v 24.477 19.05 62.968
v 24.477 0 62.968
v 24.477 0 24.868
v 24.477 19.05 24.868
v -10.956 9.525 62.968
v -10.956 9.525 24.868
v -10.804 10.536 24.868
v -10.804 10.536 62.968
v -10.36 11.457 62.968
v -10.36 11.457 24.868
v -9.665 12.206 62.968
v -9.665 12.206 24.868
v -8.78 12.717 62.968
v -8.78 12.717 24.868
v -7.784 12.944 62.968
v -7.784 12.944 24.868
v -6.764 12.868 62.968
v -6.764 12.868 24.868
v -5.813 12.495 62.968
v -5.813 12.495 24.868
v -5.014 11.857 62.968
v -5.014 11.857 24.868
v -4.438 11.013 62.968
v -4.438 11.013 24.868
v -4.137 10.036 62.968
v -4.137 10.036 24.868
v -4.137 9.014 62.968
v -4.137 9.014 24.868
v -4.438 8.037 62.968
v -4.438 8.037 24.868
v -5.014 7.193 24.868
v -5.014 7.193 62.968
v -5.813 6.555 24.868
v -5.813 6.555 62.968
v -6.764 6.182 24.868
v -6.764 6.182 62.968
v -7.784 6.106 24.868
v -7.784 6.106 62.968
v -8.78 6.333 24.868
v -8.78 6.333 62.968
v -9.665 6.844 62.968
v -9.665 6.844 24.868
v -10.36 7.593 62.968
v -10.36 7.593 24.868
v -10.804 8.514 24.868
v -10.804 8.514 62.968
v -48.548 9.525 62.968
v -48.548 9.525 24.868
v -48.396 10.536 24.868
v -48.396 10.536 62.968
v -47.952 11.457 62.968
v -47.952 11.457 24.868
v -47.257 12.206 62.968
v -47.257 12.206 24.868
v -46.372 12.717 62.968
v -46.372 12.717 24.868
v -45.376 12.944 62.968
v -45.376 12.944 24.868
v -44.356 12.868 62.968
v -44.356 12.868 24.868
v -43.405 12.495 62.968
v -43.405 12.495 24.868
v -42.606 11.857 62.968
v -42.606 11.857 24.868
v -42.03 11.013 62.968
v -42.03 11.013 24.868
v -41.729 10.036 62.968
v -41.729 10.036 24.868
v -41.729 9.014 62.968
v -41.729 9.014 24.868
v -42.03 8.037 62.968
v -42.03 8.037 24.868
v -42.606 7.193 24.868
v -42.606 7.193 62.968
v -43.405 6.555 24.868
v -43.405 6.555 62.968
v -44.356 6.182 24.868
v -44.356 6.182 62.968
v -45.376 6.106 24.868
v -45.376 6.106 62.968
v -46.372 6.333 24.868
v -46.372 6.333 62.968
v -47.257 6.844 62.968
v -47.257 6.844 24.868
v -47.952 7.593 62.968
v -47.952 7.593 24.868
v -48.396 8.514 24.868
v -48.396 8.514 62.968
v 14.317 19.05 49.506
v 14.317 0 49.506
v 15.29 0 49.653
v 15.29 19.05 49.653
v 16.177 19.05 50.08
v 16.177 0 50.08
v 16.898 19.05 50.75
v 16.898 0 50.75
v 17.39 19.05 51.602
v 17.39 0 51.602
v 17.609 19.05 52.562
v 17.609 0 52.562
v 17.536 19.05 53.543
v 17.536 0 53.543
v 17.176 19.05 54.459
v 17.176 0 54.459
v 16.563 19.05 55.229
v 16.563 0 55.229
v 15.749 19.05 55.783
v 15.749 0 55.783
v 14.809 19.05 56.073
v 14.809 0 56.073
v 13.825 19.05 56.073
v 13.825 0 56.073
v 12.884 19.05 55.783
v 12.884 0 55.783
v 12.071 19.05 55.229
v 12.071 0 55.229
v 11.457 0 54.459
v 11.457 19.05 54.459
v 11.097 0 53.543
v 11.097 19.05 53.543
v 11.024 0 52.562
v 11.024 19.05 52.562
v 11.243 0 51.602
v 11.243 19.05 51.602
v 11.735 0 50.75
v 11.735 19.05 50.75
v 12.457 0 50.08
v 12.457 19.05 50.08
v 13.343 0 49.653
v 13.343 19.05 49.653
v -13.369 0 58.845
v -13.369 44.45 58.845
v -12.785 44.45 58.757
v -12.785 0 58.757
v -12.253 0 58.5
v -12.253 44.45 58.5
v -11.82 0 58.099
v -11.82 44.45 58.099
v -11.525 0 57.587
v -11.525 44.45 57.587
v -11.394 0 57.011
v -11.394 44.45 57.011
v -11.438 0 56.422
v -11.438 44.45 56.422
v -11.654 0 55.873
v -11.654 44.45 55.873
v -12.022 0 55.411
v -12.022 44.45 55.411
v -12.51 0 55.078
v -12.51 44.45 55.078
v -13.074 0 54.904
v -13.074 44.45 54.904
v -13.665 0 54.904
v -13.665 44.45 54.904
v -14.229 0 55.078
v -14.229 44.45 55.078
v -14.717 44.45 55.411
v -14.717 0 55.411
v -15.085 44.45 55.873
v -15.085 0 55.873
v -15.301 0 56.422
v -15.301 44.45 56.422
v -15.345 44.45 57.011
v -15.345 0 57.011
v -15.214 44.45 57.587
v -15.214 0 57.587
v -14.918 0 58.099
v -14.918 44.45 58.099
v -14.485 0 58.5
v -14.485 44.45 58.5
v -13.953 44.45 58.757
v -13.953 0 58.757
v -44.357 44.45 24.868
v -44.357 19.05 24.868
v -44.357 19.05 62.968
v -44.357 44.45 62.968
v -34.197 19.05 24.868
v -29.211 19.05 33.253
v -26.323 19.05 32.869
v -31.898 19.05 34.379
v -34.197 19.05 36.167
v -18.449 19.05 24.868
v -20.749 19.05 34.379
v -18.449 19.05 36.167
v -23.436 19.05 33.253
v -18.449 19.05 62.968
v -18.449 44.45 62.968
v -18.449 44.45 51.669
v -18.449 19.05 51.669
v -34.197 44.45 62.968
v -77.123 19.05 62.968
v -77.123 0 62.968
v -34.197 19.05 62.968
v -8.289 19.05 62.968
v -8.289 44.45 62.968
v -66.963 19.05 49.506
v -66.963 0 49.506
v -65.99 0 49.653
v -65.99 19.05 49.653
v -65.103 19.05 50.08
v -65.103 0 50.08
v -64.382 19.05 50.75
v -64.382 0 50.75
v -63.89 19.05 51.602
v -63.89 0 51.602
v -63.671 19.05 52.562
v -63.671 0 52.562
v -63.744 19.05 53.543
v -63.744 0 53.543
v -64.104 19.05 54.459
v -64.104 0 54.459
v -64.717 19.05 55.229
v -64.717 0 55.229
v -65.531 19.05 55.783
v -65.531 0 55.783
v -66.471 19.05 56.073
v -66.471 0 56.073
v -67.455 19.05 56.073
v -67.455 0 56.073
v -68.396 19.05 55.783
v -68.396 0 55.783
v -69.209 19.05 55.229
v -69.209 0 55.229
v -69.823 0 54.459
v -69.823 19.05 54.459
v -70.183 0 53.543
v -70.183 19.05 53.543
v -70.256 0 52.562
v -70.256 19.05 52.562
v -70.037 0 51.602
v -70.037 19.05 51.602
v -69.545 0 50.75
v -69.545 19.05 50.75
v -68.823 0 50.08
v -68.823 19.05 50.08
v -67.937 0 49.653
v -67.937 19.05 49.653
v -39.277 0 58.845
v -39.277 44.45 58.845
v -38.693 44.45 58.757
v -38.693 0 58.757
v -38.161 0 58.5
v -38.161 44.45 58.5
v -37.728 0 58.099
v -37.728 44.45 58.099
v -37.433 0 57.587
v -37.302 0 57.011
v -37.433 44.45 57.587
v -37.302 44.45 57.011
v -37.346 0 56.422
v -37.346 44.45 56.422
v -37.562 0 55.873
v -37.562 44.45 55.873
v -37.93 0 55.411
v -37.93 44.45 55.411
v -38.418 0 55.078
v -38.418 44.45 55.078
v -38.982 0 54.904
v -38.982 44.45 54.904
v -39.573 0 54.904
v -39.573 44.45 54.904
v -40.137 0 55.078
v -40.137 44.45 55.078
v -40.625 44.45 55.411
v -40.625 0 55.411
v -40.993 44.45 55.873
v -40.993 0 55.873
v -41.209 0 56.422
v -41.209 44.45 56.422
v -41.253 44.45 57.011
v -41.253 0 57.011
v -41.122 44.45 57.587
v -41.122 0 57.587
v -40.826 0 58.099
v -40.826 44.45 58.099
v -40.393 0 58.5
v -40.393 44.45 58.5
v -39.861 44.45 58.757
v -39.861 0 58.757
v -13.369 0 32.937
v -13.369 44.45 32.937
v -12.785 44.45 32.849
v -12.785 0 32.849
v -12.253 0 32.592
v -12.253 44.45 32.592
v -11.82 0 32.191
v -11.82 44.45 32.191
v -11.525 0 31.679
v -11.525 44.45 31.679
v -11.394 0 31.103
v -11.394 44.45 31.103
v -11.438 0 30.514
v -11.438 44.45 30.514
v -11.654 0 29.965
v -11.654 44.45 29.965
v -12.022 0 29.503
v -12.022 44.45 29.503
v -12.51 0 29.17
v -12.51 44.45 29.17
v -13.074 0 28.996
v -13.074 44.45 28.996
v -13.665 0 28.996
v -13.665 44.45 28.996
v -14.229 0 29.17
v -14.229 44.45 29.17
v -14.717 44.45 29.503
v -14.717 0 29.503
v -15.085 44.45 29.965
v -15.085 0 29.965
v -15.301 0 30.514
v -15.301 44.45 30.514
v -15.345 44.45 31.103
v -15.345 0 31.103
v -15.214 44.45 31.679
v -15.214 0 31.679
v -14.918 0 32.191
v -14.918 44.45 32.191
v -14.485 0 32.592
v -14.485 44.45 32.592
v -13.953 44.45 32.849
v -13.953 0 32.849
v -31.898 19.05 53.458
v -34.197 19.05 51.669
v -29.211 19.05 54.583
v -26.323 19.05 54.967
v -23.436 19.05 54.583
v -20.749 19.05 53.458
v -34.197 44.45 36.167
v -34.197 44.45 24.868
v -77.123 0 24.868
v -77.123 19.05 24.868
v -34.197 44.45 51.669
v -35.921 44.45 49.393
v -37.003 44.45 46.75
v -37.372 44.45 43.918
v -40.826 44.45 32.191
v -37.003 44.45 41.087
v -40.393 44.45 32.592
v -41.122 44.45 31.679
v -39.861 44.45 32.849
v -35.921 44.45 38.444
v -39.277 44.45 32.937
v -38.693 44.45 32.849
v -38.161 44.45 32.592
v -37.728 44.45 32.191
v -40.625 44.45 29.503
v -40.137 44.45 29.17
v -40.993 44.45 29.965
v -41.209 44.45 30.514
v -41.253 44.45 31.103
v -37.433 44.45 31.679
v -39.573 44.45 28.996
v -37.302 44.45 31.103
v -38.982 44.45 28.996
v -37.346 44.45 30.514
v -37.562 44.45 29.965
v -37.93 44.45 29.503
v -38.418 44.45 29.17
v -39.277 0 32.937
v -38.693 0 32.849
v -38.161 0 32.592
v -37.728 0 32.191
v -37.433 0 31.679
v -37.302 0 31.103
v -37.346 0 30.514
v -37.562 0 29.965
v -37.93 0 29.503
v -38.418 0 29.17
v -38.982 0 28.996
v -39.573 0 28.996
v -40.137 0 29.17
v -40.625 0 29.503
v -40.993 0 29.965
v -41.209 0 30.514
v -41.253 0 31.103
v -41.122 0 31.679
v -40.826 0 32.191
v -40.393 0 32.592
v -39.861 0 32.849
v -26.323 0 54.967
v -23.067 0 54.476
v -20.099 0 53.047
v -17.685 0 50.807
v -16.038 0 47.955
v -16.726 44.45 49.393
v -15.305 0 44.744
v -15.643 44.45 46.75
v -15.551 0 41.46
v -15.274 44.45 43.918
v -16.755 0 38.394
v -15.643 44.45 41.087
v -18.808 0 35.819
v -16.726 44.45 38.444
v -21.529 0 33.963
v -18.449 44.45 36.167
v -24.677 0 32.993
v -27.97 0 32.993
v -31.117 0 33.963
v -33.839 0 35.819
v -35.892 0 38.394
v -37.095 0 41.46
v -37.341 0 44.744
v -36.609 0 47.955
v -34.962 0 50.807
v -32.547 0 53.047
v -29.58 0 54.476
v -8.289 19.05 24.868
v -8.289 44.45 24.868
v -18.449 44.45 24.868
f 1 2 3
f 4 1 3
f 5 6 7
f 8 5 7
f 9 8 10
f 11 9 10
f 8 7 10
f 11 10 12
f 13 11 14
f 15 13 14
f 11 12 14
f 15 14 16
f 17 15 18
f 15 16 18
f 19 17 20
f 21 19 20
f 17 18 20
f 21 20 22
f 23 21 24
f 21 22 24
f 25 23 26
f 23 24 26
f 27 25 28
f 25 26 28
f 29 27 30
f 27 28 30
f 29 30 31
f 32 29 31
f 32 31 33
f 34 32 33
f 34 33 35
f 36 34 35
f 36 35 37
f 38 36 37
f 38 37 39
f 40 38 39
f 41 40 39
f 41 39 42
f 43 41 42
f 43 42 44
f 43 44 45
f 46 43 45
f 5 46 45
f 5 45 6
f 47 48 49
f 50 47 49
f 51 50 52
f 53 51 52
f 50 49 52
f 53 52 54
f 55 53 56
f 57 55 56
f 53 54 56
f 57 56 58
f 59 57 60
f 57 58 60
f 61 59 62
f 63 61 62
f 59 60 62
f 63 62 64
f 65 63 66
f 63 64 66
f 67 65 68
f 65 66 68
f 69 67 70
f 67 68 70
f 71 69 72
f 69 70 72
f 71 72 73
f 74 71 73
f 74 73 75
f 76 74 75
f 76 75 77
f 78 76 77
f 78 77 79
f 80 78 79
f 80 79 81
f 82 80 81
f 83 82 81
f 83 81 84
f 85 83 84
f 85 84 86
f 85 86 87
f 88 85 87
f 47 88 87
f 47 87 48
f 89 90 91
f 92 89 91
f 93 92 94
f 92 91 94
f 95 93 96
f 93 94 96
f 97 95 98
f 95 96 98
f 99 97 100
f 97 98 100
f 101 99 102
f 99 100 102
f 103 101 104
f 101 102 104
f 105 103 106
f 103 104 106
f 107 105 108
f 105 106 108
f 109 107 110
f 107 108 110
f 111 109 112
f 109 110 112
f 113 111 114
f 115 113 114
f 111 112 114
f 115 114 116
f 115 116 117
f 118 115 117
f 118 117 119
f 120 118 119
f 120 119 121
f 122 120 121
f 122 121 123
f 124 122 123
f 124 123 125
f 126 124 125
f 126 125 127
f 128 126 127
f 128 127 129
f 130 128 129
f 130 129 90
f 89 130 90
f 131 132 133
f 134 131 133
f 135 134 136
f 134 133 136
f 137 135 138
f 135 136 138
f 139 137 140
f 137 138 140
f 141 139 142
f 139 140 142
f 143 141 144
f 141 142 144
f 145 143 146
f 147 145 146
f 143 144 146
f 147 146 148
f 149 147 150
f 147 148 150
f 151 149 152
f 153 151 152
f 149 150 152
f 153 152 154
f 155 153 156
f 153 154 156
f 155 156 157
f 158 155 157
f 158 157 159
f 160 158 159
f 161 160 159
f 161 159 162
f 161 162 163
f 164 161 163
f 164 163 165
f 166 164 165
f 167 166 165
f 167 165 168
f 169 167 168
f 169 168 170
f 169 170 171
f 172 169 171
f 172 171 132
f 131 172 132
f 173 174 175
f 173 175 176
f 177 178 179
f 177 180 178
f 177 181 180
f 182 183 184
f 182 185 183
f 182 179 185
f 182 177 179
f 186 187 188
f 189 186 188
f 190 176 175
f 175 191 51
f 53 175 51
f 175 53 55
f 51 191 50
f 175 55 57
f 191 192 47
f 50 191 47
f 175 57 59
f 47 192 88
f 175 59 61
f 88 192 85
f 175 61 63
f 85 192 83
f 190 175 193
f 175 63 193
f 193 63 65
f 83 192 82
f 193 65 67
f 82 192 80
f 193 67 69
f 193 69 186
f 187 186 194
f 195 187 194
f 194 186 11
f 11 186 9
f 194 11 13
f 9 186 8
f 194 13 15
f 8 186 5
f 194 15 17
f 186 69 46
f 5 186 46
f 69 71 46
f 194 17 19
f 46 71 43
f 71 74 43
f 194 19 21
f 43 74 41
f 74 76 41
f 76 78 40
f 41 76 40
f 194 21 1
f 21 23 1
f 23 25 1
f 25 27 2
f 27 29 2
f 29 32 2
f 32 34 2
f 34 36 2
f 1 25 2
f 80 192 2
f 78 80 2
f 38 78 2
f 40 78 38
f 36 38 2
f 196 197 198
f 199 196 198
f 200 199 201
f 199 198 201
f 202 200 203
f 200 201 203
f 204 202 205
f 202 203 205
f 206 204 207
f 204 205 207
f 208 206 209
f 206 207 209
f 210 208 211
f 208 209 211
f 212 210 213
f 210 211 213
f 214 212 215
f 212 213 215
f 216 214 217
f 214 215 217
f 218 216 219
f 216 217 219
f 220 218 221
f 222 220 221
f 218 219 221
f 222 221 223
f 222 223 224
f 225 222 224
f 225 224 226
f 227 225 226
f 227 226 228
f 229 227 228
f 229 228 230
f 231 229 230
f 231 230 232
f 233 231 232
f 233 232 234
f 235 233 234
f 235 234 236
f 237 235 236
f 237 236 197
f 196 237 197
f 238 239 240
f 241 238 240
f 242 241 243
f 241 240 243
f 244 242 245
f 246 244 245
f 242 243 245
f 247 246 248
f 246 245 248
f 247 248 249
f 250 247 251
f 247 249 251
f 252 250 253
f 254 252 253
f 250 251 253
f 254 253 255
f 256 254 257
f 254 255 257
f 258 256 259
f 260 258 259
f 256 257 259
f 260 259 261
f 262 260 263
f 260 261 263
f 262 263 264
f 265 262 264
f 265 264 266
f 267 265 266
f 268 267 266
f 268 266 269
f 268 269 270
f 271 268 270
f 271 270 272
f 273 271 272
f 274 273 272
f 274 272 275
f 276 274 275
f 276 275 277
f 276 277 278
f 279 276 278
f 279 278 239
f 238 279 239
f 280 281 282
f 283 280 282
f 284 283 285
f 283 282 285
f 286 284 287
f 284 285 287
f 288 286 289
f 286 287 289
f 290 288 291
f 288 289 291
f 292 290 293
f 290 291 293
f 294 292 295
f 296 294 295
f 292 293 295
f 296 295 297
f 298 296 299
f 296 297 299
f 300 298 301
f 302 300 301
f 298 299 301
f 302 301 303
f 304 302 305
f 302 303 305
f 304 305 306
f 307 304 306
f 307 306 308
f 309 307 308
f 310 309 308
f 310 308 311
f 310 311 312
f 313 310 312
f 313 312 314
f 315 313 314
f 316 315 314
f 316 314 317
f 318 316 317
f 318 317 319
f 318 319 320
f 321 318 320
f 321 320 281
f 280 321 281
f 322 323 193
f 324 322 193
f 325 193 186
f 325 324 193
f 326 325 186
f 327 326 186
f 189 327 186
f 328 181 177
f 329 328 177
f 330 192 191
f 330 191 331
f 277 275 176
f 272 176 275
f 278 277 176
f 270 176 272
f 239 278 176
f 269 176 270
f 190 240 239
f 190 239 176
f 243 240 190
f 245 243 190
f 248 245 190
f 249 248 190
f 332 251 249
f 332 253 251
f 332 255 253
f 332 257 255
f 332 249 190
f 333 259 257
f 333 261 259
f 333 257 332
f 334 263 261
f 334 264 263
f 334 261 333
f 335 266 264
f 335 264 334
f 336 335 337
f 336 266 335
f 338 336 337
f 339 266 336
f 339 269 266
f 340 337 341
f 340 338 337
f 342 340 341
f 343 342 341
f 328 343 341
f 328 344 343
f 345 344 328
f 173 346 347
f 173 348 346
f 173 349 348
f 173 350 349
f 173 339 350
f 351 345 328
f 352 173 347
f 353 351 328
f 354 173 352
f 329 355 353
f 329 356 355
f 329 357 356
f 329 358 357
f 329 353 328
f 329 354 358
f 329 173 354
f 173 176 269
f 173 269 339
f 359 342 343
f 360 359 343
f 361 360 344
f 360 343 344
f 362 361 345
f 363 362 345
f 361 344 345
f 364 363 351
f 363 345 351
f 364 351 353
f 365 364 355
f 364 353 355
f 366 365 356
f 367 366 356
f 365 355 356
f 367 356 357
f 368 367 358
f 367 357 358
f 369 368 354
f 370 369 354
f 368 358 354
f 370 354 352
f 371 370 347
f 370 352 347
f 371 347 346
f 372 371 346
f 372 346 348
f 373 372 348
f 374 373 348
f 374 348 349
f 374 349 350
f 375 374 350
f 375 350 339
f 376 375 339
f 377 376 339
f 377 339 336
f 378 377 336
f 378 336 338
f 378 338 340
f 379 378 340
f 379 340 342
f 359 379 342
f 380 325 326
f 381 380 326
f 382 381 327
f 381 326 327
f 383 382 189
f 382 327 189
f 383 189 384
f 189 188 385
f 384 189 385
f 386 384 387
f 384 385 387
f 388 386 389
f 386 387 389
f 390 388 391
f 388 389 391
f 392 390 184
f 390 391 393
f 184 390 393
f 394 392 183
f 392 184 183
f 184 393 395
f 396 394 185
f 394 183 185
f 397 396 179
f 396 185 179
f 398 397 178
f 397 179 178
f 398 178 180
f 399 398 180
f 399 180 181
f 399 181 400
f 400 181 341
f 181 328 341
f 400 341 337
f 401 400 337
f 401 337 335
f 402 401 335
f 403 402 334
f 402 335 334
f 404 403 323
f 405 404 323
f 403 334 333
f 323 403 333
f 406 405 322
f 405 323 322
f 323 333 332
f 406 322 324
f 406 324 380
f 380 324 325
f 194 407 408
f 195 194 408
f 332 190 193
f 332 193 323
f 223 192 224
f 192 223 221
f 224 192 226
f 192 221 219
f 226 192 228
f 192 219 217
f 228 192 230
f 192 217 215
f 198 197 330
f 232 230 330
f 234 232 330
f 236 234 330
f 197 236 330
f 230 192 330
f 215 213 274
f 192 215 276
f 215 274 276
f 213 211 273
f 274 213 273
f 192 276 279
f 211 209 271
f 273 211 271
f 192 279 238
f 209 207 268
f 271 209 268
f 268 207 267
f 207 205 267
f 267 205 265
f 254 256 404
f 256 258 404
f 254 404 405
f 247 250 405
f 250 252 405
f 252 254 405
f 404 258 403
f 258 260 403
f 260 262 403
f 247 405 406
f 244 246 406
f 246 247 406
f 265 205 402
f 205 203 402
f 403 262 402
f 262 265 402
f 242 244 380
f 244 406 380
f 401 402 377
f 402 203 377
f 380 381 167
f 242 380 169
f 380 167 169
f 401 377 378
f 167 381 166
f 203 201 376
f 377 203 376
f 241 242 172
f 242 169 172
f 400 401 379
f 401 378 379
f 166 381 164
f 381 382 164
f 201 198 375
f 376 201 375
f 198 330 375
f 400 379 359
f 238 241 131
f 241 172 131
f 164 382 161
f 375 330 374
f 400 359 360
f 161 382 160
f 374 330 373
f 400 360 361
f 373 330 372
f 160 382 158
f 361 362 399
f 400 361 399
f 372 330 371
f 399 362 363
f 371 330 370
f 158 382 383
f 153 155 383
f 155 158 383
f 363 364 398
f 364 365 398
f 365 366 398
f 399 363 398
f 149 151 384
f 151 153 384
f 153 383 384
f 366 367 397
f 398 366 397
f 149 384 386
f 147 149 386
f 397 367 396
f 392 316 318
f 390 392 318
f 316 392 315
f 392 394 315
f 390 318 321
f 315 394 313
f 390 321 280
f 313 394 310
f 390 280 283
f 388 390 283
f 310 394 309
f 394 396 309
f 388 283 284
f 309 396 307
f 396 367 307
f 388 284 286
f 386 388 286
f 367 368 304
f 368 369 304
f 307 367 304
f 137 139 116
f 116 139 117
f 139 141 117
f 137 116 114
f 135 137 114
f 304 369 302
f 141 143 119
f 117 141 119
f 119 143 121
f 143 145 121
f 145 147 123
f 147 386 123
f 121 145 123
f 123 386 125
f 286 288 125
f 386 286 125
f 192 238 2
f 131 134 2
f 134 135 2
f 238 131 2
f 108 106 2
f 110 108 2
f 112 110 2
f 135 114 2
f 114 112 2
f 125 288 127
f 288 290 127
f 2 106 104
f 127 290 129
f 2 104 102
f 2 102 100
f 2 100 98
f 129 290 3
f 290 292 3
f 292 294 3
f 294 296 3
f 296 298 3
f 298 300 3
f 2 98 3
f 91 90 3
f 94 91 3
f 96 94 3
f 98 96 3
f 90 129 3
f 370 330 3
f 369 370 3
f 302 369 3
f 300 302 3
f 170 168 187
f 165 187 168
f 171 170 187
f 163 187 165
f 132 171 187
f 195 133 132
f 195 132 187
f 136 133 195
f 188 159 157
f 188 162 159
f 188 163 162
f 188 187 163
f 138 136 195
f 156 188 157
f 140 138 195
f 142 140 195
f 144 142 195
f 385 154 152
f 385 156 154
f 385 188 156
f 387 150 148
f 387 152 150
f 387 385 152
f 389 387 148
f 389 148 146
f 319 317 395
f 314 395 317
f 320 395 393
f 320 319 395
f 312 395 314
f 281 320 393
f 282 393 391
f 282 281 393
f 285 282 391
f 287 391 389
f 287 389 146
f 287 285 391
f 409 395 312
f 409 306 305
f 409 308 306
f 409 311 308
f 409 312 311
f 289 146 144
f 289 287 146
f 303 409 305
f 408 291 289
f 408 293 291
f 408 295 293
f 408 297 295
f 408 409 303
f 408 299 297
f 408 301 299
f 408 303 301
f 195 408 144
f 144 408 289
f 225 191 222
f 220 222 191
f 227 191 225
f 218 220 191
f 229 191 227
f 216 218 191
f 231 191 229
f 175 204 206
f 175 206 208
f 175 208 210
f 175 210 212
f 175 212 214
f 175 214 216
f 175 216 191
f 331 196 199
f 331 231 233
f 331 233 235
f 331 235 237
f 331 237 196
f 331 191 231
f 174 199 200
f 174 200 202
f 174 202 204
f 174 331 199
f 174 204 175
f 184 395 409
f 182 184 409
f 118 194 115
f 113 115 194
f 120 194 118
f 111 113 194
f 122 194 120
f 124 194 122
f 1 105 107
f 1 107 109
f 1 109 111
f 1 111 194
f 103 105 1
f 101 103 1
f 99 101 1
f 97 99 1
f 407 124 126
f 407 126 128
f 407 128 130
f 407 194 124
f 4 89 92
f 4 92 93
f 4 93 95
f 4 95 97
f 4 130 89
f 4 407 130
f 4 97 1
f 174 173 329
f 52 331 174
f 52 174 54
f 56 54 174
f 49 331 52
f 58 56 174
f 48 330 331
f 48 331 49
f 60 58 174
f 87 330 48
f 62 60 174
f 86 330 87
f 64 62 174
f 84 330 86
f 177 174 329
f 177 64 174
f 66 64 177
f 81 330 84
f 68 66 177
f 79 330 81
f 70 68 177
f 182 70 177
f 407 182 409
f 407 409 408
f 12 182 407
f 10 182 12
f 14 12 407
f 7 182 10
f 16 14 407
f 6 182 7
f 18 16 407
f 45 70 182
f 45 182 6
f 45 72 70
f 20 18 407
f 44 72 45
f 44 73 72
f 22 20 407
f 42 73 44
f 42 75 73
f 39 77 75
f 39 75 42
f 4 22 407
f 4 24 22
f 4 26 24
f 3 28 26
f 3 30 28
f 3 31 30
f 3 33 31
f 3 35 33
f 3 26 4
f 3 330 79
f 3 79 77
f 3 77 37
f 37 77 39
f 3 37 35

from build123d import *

# Parameters (mm, degrees)
SKETCH3_W               = 101.6
SKETCH3_H               = 38.1
BOSS_EXTRUDE2_DEPTH     = 19.05
BOSS_EXTRUDE4_START     = 24.868285686
BOSS_EXTRUDE4_OUTLINE_W = 36.068
BOSS_EXTRUDE4_OUTLINE_H = 25.4
BOSS_EXTRUDE4_DEPTH     = 38.1
CUT_EXTRUDE2_REACH      = 111.036
SKETCH7_R               = 11.049
SKETCH7_R_2             = 1.9812
SKETCH8_W               = 15.748
SKETCH8_H               = 38.1
CUT_EXTRUDE3_DEPTH      = 25.4
CUT_EXTRUDE4_REACH      = 111.036
SKETCH9_R               = 3.302
CUT_EXTRUDE5_REACH      = 98.827
SKETCH11_R              = 3.429


# Read off the part's stored shape, not the designer's step: Boss-Extrude4
with BuildPart() as part:
    # Sketch3 → Boss-Extrude2 (new body)
    with BuildSketch(Plane(origin=(0, 0, 0), x_dir=(1, 0, 0), z_dir=(0, 1, 0))):
        with Locations((-26.323326811, -43.918285686)):
            Rectangle(SKETCH3_W, SKETCH3_H)
    extrude(amount=BOSS_EXTRUDE2_DEPTH)

    # Boss-Extrude4 outline → Boss-Extrude4 (add)
    with BuildSketch(Plane.XY.offset(BOSS_EXTRUDE4_START)):
        with Locations((-26.323326811, 31.75)):
            Rectangle(BOSS_EXTRUDE4_OUTLINE_W, BOSS_EXTRUDE4_OUTLINE_H)
    extrude(amount=BOSS_EXTRUDE4_DEPTH)

    # Sketch7 → Cut-Extrude2 (cut, up to next)
    with BuildSketch(Plane(origin=(0, 44.45, 0), x_dir=(1, 0, 0), z_dir=(0, 1, 0)), mode=Mode.PRIVATE) as cut_extrude2_sk1:
        with Locations(Location((-26.323326811, -43.918285686, 0), (0, 0, 270))):
            Circle(SKETCH7_R)
    cut_extrude2_tool1 = extrude(cut_extrude2_sk1.sketch, amount=-CUT_EXTRUDE2_REACH, mode=Mode.PRIVATE) & part.part
    # Sketch7 → Cut-Extrude2 (cut, up to next)
    with BuildSketch(Plane(origin=(0, 44.45, 0), x_dir=(1, 0, 0), z_dir=(0, 1, 0)), mode=Mode.PRIVATE) as cut_extrude2_sk2:
        with Locations(Location((-13.369326811, -56.863342795, 0), (0, 0, 270))):
            Circle(SKETCH7_R_2)
    cut_extrude2_tool2 = extrude(cut_extrude2_sk2.sketch, amount=-CUT_EXTRUDE2_REACH, mode=Mode.PRIVATE) & part.part
    # Sketch7 → Cut-Extrude2 (cut, up to next)
    with BuildSketch(Plane(origin=(0, 44.45, 0), x_dir=(1, 0, 0), z_dir=(0, 1, 0)), mode=Mode.PRIVATE) as cut_extrude2_sk3:
        with Locations(Location((-39.277326811, -56.863342795, 0), (0, 0, 270))):
            Circle(SKETCH7_R_2)
    cut_extrude2_tool3 = extrude(cut_extrude2_sk3.sketch, amount=-CUT_EXTRUDE2_REACH, mode=Mode.PRIVATE) & part.part
    # Sketch7 → Cut-Extrude2 (cut, up to next)
    with BuildSketch(Plane(origin=(0, 44.45, 0), x_dir=(1, 0, 0), z_dir=(0, 1, 0)), mode=Mode.PRIVATE) as cut_extrude2_sk4:
        with Locations(Location((-39.277326811, -30.955342795, 0), (0, 0, 270))):
            Circle(SKETCH7_R_2)
    cut_extrude2_tool4 = extrude(cut_extrude2_sk4.sketch, amount=-CUT_EXTRUDE2_REACH, mode=Mode.PRIVATE) & part.part
    # Sketch7 → Cut-Extrude2 (cut, up to next)
    with BuildSketch(Plane(origin=(0, 44.45, 0), x_dir=(1, 0, 0), z_dir=(0, 1, 0)), mode=Mode.PRIVATE) as cut_extrude2_sk5:
        with Locations(Location((-13.369326811, -30.955342795, 0), (0, 0, 270))):
            Circle(SKETCH7_R_2)
    cut_extrude2_tool5 = extrude(cut_extrude2_sk5.sketch, amount=-CUT_EXTRUDE2_REACH, mode=Mode.PRIVATE) & part.part
    add(cut_extrude2_tool1.solids().sort_by_distance((-26.323327, 44.45, 43.918286))[0], mode=Mode.SUBTRACT)
    add(cut_extrude2_tool2.solids().sort_by_distance((-13.369327, 44.45, 56.863343))[0], mode=Mode.SUBTRACT)
    add(cut_extrude2_tool3.solids().sort_by_distance((-39.277327, 44.45, 56.863343))[0], mode=Mode.SUBTRACT)
    add(cut_extrude2_tool4.solids().sort_by_distance((-39.277327, 44.45, 30.955343))[0], mode=Mode.SUBTRACT)
    add(cut_extrude2_tool5.solids().sort_by_distance((-13.369327, 44.45, 30.955343))[0], mode=Mode.SUBTRACT)

    # Sketch8 → Cut-Extrude3 (cut)
    with BuildSketch(Plane(origin=(0, 44.45, 0), x_dir=(1, 0, 0), z_dir=(0, 1, 0))):
        with Locations((-26.323326811, -43.918285686)):
            Rectangle(SKETCH8_W, SKETCH8_H)
    extrude(amount=-CUT_EXTRUDE3_DEPTH, mode=Mode.SUBTRACT)

    # Sketch9 → Cut-Extrude4 (cut, up to next)
    with BuildSketch(Plane.XZ, mode=Mode.PRIVATE) as cut_extrude4_sk1:
        with Locations(Location((14.316673189, 52.808285686, 0), (0, 0, 270))):
            Circle(SKETCH9_R)
    cut_extrude4_tool1 = extrude(cut_extrude4_sk1.sketch, amount=-CUT_EXTRUDE4_REACH, mode=Mode.PRIVATE) & part.part
    # Sketch9 → Cut-Extrude4 (cut, up to next)
    with BuildSketch(Plane.XZ, mode=Mode.PRIVATE) as cut_extrude4_sk2:
        with Locations(Location((-66.963326811, 52.808285686, 0), (0, 0, 270))):
            Circle(SKETCH9_R)
    cut_extrude4_tool2 = extrude(cut_extrude4_sk2.sketch, amount=-CUT_EXTRUDE4_REACH, mode=Mode.PRIVATE) & part.part
    add(cut_extrude4_tool1.solids().sort_by_distance((14.316673, 0, 52.808286))[0], mode=Mode.SUBTRACT)
    add(cut_extrude4_tool2.solids().sort_by_distance((-66.963327, 0, 52.808286))[0], mode=Mode.SUBTRACT)

    # Sketch11 → Cut-Extrude5 (cut, up to next)
    with BuildSketch(Plane(origin=(0, 0, 24.868285686), x_dir=(-1, 0, 0), z_dir=(0, 0, -1)), mode=Mode.PRIVATE) as cut_extrude5_sk1:
        with Locations((7.527326811, 9.525)):
            Circle(SKETCH11_R)
    cut_extrude5_tool1 = extrude(cut_extrude5_sk1.sketch, amount=-CUT_EXTRUDE5_REACH, mode=Mode.PRIVATE) & part.part
    # Sketch11 → Cut-Extrude5 (cut, up to next)
    with BuildSketch(Plane(origin=(0, 0, 24.868285686), x_dir=(-1, 0, 0), z_dir=(0, 0, -1)), mode=Mode.PRIVATE) as cut_extrude5_sk2:
        with Locations((45.119326811, 9.525)):
            Circle(SKETCH11_R)
    cut_extrude5_tool2 = extrude(cut_extrude5_sk2.sketch, amount=-CUT_EXTRUDE5_REACH, mode=Mode.PRIVATE) & part.part
    add(cut_extrude5_tool1.solids().sort_by_distance((-7.527327, 9.525, 24.868286))[0], mode=Mode.SUBTRACT)
    add(cut_extrude5_tool2.solids().sort_by_distance((-45.119327, 9.525, 24.868286))[0], mode=Mode.SUBTRACT)


solid = part.part
